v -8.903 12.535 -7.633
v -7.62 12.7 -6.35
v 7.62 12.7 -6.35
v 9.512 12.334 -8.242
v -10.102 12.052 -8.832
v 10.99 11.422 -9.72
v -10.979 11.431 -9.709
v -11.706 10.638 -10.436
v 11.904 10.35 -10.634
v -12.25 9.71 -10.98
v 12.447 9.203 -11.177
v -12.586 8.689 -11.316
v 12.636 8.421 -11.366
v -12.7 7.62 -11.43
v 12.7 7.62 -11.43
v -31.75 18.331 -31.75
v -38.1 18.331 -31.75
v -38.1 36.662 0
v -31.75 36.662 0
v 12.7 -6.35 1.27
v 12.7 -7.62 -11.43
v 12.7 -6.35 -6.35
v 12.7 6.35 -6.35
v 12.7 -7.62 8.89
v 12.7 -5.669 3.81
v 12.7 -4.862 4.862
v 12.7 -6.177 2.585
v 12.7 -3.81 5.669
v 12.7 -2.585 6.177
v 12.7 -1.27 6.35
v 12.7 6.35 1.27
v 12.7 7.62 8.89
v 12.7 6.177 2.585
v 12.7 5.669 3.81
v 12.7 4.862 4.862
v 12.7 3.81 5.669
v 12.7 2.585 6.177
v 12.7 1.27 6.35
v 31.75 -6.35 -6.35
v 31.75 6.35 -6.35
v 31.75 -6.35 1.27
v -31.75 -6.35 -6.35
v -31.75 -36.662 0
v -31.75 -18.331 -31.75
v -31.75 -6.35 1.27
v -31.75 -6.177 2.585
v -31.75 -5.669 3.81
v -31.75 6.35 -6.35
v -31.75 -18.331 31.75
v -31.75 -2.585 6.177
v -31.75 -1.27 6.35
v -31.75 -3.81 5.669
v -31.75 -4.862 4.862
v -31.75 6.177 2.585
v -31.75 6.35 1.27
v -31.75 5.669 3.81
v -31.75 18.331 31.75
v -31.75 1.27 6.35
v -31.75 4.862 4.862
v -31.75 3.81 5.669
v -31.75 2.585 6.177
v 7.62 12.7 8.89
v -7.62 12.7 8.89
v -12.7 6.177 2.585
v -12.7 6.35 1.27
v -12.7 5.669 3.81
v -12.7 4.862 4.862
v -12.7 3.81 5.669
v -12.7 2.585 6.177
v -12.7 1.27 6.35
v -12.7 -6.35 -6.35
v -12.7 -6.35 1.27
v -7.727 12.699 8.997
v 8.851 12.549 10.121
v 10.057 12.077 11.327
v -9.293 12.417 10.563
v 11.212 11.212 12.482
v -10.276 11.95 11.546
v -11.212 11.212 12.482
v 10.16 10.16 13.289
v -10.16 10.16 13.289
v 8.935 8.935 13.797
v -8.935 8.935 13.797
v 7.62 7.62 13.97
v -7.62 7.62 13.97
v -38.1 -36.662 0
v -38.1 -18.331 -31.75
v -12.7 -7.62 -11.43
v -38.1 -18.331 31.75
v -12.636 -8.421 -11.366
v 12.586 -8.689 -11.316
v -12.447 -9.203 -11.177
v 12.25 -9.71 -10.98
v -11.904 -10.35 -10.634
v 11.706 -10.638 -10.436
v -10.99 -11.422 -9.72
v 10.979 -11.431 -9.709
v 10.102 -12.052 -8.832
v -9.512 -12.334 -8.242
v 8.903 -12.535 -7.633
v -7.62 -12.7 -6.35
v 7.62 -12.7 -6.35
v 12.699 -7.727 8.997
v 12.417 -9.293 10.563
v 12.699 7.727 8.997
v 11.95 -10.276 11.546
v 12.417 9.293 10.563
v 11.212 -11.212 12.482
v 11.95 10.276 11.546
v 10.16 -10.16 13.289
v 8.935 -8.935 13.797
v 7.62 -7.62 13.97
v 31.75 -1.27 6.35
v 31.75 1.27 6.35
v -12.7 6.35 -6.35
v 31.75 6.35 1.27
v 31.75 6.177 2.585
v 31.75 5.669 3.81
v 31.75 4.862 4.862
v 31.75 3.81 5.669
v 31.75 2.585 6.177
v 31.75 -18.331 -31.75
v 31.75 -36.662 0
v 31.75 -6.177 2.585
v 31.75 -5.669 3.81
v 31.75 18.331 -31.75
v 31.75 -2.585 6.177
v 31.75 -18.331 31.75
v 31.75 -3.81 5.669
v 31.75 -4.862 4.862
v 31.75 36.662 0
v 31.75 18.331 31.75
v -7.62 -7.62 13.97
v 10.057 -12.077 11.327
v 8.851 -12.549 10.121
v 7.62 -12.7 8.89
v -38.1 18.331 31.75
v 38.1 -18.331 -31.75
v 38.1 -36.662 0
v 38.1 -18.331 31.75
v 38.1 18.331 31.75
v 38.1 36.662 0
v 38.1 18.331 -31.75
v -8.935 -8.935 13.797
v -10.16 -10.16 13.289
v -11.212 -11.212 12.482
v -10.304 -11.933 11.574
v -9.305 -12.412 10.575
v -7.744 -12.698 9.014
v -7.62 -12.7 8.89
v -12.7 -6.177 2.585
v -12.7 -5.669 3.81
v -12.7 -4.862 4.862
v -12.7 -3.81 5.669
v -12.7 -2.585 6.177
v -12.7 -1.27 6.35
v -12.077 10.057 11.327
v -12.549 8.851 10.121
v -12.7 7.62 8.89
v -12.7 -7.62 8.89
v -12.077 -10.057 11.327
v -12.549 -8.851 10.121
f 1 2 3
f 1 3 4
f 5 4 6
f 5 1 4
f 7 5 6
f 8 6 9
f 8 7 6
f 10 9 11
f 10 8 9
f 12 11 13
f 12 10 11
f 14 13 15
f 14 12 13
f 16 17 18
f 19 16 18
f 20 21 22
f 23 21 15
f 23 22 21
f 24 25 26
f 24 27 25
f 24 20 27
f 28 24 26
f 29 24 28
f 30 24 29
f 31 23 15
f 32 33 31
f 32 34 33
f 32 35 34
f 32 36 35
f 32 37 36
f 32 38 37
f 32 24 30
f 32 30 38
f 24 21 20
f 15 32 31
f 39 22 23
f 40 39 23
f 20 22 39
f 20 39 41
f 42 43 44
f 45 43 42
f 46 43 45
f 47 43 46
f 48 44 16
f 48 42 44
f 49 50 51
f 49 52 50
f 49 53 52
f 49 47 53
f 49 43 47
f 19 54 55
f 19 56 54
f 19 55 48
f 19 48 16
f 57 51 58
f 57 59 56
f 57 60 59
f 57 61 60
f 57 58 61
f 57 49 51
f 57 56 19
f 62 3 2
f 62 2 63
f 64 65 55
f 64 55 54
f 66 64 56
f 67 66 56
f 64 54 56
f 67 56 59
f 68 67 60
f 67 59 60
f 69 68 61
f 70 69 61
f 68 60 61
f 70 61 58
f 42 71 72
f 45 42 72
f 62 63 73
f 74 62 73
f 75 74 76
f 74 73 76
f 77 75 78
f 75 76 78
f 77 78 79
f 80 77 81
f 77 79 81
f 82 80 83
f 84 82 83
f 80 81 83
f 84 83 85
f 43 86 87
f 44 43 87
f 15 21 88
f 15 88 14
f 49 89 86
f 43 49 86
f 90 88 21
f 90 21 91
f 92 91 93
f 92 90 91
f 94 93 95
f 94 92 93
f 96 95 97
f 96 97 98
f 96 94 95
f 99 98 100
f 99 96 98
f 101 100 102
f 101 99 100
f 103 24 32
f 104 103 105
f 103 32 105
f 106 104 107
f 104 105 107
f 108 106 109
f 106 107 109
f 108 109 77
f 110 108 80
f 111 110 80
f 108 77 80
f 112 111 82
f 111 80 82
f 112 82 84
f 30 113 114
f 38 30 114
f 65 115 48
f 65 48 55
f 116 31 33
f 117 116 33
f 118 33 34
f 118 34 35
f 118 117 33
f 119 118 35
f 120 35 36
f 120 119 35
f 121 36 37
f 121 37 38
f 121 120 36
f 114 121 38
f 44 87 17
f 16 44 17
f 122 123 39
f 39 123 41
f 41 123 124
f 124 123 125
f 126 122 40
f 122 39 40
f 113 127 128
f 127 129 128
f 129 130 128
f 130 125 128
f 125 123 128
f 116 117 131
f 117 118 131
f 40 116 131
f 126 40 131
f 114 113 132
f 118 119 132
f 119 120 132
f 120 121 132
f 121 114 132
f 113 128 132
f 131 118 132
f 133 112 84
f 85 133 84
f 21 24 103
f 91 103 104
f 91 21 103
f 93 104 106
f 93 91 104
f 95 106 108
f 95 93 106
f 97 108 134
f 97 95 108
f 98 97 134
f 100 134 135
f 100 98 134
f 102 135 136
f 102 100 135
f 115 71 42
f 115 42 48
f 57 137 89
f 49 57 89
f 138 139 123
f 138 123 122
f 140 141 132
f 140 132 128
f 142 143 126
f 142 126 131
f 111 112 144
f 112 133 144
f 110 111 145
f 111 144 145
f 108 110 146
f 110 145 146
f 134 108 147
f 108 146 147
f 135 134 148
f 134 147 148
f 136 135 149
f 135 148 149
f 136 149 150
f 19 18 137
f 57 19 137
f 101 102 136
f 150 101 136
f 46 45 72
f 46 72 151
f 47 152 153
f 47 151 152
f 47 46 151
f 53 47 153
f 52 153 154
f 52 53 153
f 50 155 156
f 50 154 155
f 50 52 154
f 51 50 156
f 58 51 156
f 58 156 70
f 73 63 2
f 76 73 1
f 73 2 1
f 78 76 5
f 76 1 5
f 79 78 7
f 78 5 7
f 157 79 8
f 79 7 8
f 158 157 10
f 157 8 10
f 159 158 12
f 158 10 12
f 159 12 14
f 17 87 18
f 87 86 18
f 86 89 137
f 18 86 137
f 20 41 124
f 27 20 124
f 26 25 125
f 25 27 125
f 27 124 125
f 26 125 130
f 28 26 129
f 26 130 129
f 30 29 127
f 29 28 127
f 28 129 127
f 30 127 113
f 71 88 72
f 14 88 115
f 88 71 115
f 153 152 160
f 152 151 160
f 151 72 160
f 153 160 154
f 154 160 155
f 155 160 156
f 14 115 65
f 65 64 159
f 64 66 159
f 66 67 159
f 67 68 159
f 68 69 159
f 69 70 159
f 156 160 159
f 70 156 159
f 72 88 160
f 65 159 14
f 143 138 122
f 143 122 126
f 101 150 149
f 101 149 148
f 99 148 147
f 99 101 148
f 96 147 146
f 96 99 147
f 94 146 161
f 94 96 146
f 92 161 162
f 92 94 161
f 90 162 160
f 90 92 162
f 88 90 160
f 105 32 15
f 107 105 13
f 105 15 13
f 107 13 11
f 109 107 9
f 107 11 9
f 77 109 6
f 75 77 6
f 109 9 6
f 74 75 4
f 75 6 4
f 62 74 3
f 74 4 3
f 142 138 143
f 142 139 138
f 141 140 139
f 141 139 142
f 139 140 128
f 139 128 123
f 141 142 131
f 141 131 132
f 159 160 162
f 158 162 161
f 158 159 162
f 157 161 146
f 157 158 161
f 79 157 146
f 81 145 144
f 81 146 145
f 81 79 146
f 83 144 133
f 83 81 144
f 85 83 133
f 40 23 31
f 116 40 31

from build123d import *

# Parameters (mm, degrees)
F0_W         = 12.7
F0_H         = 12.7
F1_DEPTH     = 38.1
F2_R         = 5.08
F3_W         = 25.4
F3_H         = 25.4
F4_DEPTH     = 12.7
F6_DEPTH     = 6.35
F8_R         = 5.08
F9_T1_DEPTH  = 45.72
F9_T3_DEPTH  = 50.8
F10_T1_DEPTH = 45.72
F10_T3_DEPTH = 50.8


# Not quite as in the source:
# - a fillet or chamfer that OpenCascade refuses, or shapes differently, is made with other operations: its cross-section is extruded or revolved along the edge and cut away or added


with BuildPart() as f1:
    # F0 (on Right) → F1 (new body)
    with BuildSketch(Plane.YZ):
        Rectangle(F0_W, F0_H)
    extrude(amount=F1_DEPTH)

    # F2
    f2_edges = [f1.edges().sort_by_distance(p)[0] for p in [
        (19.05, 6.35, 6.35),
        (19.05, -6.35, 6.35),
        (0, 0, 6.35),
    ]]
    fillet(f2_edges, radius=F2_R)

    # F3 (on Right) → F4 (join)
    with BuildSketch(Plane.YZ):
        with Locations((0, 1.27)):
            Rectangle(F3_W, F3_H)
    extrude(amount=F4_DEPTH)

    # F5 (on face) → F6 (join)
    with BuildSketch(Plane.YZ.offset(38.1)):
        Polygon((-18.3308710468, -31.75), (18.3308710468, -31.75), (36.6617420935, 0), (18.3308710468, 31.75), (-18.3308710468, 31.75), (-36.6617420935, 0), align=None)
    extrude(amount=-F6_DEPTH)

    # F7: F1 across plane


with BuildPart() as f1_1:
    add(f1.part)
    add(f1.part.mirror(Plane.YZ))

    # F8
    f8_edges = [f1_1.edges().sort_by_distance(p)[0] for p in [
        (12.7, 0, 13.97),
        (0, -12.7, 13.97),
        (-12.7, 0, 13.97),
        (0, 12.7, 13.97),
    ]]
    fillet(f8_edges, radius=F8_R)

    # F9: fillet of radius 5.08 on 4 edges, made by hand

    # F9_s2 → F9_t1 (cut)
    with BuildSketch(Plane.XY.offset(-24.13)):
        with BuildLine():
            ThreePointArc((12.7, -7.62), (11.2121024484, -11.2121024484), (7.62, -12.7))
            Line((7.62, -12.7), (12.7, -12.7))
            Line((12.7, -12.7), (12.7, -7.62))
        make_face()
        with BuildLine():
            ThreePointArc((-7.62, -12.7), (-11.2121024484, -11.2121024484), (-12.7, -7.62))
            Line((-12.7, -7.62), (-12.7, -12.7))
            Line((-12.7, -12.7), (-7.62, -12.7))
        make_face()
    extrude(amount=F9_T1_DEPTH, mode=Mode.SUBTRACT)

    # F9_s4 → F9_t3 (cut)
    with BuildSketch(Plane.YZ.offset(-25.4)):
        with BuildLine():
            ThreePointArc((-7.62, -11.43), (-11.2121024484, -9.9421024484), (-12.7, -6.35))
            Line((-12.7, -6.35), (-12.7, -11.43))
            Line((-12.7, -11.43), (-7.62, -11.43))
        make_face()
    extrude(amount=F9_T3_DEPTH, mode=Mode.SUBTRACT)

    # F10: fillet of radius 5.08 on 4 edges, made by hand

    # F10_s2 → F10_t1 (cut)
    with BuildSketch(Plane.XY.offset(-24.13)):
        with BuildLine():
            ThreePointArc((12.7, 7.62), (11.2121024484, 11.2121024484), (7.62, 12.7))
            Line((7.62, 12.7), (12.7, 12.7))
            Line((12.7, 12.7), (12.7, 7.62))
        make_face()
        with BuildLine():
            ThreePointArc((-7.62, 12.7), (-11.2121024484, 11.2121024484), (-12.7, 7.62))
            Line((-12.7, 7.62), (-12.7, 12.7))
            Line((-12.7, 12.7), (-7.62, 12.7))
        make_face()
    extrude(amount=F10_T1_DEPTH, mode=Mode.SUBTRACT)

    # F10_s4 → F10_t3 (cut)
    with BuildSketch(Plane.YZ.offset(-25.4)):
        with BuildLine():
            ThreePointArc((12.7, -6.35), (11.2121024484, -9.9421024484), (7.62, -11.43))
            Line((7.62, -11.43), (12.7, -11.43))
            Line((12.7, -11.43), (12.7, -6.35))
        make_face()
    extrude(amount=F10_T3_DEPTH, mode=Mode.SUBTRACT)


solid = f1_1.part
